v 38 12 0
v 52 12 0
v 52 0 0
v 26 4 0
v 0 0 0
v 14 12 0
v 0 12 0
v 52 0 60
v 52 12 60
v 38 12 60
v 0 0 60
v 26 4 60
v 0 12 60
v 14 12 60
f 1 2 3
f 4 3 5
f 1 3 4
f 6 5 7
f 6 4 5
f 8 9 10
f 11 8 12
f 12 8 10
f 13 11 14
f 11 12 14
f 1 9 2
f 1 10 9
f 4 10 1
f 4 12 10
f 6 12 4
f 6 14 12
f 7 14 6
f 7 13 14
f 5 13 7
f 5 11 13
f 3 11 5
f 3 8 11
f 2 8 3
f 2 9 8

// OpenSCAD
$fn = 32;

// ----------------------------------------------------------------------
// V guide rail: vway, 52 mm wide
// ----------------------------------------------------------------------

// --- parameters (mm) ---
rail_w = 52;              // rail width, X
base_t = 12;              // base plate thickness
v_depth = 8;              // V feature depth / height
v_half_w = 12;            // half width of the V at the base face
plate_t = 60;             // rail length, Z (the extrusion height)

profile = [[0, 0], [52, 0], [52, 12], [38, 12], [26, 4], [14, 12], [0, 12]];  // primary outline, 7 points, counter clockwise

// --- the one profile operation ---
linear_extrude(height = plate_t) polygon(points = profile);
